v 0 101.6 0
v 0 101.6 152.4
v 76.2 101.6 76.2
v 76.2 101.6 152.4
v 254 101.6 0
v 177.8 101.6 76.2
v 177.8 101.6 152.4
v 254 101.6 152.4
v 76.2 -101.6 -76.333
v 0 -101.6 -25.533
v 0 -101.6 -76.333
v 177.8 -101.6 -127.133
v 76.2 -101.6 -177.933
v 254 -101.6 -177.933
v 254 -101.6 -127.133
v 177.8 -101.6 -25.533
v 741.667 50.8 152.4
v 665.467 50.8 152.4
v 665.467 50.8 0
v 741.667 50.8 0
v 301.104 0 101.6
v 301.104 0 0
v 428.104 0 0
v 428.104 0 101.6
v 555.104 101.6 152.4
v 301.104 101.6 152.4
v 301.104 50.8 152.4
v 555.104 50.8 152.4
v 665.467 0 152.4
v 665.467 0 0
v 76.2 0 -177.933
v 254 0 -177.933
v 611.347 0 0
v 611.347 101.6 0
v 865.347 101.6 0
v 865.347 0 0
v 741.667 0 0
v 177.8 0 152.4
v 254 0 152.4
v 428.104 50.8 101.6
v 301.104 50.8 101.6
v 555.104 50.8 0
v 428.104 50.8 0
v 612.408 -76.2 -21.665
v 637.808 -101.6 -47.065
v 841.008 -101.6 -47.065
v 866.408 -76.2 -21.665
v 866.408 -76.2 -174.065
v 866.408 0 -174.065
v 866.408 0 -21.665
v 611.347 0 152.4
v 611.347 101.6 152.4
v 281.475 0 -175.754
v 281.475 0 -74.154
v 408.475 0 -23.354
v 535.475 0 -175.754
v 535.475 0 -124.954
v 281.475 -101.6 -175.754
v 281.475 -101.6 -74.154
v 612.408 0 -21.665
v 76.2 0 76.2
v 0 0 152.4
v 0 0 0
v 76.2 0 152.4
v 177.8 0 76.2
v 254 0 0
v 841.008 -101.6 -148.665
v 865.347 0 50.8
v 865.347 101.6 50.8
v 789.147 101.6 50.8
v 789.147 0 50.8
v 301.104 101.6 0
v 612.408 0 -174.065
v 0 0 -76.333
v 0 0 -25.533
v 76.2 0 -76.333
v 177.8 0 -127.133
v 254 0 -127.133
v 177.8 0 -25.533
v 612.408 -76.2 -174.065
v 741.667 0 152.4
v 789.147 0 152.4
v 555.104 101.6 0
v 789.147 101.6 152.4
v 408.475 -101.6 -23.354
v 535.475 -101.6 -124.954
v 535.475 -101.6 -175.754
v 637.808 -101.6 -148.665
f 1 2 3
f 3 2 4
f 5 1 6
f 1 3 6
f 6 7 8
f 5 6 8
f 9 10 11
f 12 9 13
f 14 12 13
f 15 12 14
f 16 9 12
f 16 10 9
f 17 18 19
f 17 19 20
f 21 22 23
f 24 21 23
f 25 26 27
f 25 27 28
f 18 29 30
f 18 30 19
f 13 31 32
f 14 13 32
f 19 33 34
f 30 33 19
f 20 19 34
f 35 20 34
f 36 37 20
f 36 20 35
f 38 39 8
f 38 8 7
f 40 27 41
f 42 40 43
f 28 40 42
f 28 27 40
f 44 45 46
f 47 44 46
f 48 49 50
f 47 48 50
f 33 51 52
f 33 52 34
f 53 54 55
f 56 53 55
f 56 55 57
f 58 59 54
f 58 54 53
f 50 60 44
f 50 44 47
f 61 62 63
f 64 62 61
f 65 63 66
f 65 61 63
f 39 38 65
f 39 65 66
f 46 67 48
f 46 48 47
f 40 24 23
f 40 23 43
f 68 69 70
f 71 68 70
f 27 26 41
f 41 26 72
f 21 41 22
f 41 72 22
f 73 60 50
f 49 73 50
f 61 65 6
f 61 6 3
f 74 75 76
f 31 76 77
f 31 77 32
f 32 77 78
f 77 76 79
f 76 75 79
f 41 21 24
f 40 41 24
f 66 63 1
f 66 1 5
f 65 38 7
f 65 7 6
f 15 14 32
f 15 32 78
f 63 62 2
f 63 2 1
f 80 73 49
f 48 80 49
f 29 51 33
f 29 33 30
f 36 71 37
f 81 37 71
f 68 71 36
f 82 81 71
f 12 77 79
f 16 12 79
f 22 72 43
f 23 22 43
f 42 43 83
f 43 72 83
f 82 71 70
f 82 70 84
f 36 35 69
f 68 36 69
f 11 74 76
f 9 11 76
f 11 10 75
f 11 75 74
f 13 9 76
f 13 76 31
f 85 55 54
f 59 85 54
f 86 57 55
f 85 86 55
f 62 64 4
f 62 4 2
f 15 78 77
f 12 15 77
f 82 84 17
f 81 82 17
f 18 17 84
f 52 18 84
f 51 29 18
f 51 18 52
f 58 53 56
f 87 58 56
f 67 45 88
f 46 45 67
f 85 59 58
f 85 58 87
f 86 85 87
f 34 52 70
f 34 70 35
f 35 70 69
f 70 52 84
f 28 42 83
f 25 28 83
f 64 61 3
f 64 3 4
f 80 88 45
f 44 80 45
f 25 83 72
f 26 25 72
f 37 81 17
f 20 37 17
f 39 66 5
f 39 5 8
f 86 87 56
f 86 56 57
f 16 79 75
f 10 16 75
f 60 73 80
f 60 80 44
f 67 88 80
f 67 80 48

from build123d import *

# Parameters (mm, degrees)
F1_DEPTH  = 101.6
F3_DEPTH  = 25.4
F4_DEPTH  = 127
F5_W      = 127
F5_H      = 50.8
F6_DEPTH  = 50.8
F8_DEPTH  = 101.6
F9_W      = 76.2
F9_H      = 50.8
F10_DEPTH = 152.4
F12_DEPTH = 101.6
F13_W     = 76.2
F13_H     = 50.8
F14_DEPTH = 152.4
F16_DEPTH = 101.6
F17_W     = 254
F17_H     = 152.4
F18_DEPTH = 101.6
F19_SIZE  = 25.4


with BuildPart() as f1:
    # F0 (on Front) → F1 (new body)
    with BuildSketch(Plane.XZ):
        Polygon((0, 152.4), (0, 0), (254, 0), (254, 152.4), (177.8, 152.4), (177.8, 76.2), (76.2, 76.2), (76.2, 152.4), align=None)
    extrude(amount=-F1_DEPTH)


with BuildPart() as f3:
    # F2 (on Top) → F3 (new body)
    with BuildSketch(Plane.XY):
        Polygon((301.103534, 101.6), (301.103534, 0), (428.103534, 0), (428.103534, 50.8), (555.103534, 50.8), (555.103534, 101.6), align=None)
    extrude(amount=F3_DEPTH)

    # F3_face (on face) → F4 (join)
    with BuildSketch(Plane(origin=(406.936867, 59.266667, 25.4), x_dir=(1, 0, 0), z_dir=(0, 0, 1))):
        Polygon((-105.833333, 42.333333), (-105.833333, -59.266667), (21.166667, -59.266667), (21.166667, -8.466667), (148.166667, -8.466667), (148.166667, 42.333333), align=None)
    extrude(amount=F4_DEPTH)

    # F5 (on face) → F6 (cut)
    with BuildSketch(Plane.XZ):
        with Locations((364.603534, 127)):
            Rectangle(F5_W, F5_H)
    extrude(amount=-F6_DEPTH, mode=Mode.SUBTRACT)


with BuildPart() as f8:
    # F7 (on Front) → F8 (new body)
    with BuildSketch(Plane.XZ):
        Polygon((611.347409, 152.4), (611.347409, 0), (865.347409, 0), (865.347409, 50.8), (789.147409, 50.8), (789.147409, 152.4), align=None)
    extrude(amount=-F8_DEPTH)

    # F9 (on face) → F10 (join)
    with BuildSketch(Plane.XY.offset(152.4)):
        with Locations((700.247409, 25.4)):
            Rectangle(F9_W, F9_H)
    extrude(amount=-F10_DEPTH)

    # F13 (on face) → F14 (cut)
    with BuildSketch(Plane.XY.offset(152.4)):
        with Locations((703.567203, 25.4)):
            Rectangle(F13_W, F13_H)
    extrude(amount=-F14_DEPTH, mode=Mode.SUBTRACT)


with BuildPart() as f12:
    # F11 (on Front) → F12 (new body)
    with BuildSketch(Plane.XZ):
        Polygon((177.8, -25.532638), (0, -25.532638), (0, -76.332638), (76.2, -76.332638), (76.2, -177.932638), (254, -177.932638), (254, -127.132638), (177.8, -127.132638), align=None)
    extrude(amount=F12_DEPTH)


with BuildPart() as f16:
    # F15 (on Front) → F16 (new body)
    with BuildSketch(Plane.XZ):
        Polygon((281.474884, -74.15426), (281.474884, -175.75426), (535.474884, -175.75426), (535.474884, -124.95426), (408.474884, -23.35426), align=None)
    extrude(amount=F16_DEPTH)


with BuildPart() as f18:
    # F17 (on Front) → F18 (new body)
    with BuildSketch(Plane.XZ):
        with Locations((739.408397, -97.865011)):
            Rectangle(F17_W, F17_H)
    extrude(amount=F18_DEPTH)

    # F19
    f19_edges = [f18.edges().sort_by_distance(p)[0] for p in [
        (866.408397, -101.6, -97.865011),
        (739.408397, -101.6, -21.665011),
        (612.408397, -101.6, -97.865011),
        (739.408397, -101.6, -174.065011),
    ]]
    chamfer(f19_edges, length=F19_SIZE)


solid = Compound([f1.part, f3.part, f8.part, f12.part, f16.part, f18.part])
